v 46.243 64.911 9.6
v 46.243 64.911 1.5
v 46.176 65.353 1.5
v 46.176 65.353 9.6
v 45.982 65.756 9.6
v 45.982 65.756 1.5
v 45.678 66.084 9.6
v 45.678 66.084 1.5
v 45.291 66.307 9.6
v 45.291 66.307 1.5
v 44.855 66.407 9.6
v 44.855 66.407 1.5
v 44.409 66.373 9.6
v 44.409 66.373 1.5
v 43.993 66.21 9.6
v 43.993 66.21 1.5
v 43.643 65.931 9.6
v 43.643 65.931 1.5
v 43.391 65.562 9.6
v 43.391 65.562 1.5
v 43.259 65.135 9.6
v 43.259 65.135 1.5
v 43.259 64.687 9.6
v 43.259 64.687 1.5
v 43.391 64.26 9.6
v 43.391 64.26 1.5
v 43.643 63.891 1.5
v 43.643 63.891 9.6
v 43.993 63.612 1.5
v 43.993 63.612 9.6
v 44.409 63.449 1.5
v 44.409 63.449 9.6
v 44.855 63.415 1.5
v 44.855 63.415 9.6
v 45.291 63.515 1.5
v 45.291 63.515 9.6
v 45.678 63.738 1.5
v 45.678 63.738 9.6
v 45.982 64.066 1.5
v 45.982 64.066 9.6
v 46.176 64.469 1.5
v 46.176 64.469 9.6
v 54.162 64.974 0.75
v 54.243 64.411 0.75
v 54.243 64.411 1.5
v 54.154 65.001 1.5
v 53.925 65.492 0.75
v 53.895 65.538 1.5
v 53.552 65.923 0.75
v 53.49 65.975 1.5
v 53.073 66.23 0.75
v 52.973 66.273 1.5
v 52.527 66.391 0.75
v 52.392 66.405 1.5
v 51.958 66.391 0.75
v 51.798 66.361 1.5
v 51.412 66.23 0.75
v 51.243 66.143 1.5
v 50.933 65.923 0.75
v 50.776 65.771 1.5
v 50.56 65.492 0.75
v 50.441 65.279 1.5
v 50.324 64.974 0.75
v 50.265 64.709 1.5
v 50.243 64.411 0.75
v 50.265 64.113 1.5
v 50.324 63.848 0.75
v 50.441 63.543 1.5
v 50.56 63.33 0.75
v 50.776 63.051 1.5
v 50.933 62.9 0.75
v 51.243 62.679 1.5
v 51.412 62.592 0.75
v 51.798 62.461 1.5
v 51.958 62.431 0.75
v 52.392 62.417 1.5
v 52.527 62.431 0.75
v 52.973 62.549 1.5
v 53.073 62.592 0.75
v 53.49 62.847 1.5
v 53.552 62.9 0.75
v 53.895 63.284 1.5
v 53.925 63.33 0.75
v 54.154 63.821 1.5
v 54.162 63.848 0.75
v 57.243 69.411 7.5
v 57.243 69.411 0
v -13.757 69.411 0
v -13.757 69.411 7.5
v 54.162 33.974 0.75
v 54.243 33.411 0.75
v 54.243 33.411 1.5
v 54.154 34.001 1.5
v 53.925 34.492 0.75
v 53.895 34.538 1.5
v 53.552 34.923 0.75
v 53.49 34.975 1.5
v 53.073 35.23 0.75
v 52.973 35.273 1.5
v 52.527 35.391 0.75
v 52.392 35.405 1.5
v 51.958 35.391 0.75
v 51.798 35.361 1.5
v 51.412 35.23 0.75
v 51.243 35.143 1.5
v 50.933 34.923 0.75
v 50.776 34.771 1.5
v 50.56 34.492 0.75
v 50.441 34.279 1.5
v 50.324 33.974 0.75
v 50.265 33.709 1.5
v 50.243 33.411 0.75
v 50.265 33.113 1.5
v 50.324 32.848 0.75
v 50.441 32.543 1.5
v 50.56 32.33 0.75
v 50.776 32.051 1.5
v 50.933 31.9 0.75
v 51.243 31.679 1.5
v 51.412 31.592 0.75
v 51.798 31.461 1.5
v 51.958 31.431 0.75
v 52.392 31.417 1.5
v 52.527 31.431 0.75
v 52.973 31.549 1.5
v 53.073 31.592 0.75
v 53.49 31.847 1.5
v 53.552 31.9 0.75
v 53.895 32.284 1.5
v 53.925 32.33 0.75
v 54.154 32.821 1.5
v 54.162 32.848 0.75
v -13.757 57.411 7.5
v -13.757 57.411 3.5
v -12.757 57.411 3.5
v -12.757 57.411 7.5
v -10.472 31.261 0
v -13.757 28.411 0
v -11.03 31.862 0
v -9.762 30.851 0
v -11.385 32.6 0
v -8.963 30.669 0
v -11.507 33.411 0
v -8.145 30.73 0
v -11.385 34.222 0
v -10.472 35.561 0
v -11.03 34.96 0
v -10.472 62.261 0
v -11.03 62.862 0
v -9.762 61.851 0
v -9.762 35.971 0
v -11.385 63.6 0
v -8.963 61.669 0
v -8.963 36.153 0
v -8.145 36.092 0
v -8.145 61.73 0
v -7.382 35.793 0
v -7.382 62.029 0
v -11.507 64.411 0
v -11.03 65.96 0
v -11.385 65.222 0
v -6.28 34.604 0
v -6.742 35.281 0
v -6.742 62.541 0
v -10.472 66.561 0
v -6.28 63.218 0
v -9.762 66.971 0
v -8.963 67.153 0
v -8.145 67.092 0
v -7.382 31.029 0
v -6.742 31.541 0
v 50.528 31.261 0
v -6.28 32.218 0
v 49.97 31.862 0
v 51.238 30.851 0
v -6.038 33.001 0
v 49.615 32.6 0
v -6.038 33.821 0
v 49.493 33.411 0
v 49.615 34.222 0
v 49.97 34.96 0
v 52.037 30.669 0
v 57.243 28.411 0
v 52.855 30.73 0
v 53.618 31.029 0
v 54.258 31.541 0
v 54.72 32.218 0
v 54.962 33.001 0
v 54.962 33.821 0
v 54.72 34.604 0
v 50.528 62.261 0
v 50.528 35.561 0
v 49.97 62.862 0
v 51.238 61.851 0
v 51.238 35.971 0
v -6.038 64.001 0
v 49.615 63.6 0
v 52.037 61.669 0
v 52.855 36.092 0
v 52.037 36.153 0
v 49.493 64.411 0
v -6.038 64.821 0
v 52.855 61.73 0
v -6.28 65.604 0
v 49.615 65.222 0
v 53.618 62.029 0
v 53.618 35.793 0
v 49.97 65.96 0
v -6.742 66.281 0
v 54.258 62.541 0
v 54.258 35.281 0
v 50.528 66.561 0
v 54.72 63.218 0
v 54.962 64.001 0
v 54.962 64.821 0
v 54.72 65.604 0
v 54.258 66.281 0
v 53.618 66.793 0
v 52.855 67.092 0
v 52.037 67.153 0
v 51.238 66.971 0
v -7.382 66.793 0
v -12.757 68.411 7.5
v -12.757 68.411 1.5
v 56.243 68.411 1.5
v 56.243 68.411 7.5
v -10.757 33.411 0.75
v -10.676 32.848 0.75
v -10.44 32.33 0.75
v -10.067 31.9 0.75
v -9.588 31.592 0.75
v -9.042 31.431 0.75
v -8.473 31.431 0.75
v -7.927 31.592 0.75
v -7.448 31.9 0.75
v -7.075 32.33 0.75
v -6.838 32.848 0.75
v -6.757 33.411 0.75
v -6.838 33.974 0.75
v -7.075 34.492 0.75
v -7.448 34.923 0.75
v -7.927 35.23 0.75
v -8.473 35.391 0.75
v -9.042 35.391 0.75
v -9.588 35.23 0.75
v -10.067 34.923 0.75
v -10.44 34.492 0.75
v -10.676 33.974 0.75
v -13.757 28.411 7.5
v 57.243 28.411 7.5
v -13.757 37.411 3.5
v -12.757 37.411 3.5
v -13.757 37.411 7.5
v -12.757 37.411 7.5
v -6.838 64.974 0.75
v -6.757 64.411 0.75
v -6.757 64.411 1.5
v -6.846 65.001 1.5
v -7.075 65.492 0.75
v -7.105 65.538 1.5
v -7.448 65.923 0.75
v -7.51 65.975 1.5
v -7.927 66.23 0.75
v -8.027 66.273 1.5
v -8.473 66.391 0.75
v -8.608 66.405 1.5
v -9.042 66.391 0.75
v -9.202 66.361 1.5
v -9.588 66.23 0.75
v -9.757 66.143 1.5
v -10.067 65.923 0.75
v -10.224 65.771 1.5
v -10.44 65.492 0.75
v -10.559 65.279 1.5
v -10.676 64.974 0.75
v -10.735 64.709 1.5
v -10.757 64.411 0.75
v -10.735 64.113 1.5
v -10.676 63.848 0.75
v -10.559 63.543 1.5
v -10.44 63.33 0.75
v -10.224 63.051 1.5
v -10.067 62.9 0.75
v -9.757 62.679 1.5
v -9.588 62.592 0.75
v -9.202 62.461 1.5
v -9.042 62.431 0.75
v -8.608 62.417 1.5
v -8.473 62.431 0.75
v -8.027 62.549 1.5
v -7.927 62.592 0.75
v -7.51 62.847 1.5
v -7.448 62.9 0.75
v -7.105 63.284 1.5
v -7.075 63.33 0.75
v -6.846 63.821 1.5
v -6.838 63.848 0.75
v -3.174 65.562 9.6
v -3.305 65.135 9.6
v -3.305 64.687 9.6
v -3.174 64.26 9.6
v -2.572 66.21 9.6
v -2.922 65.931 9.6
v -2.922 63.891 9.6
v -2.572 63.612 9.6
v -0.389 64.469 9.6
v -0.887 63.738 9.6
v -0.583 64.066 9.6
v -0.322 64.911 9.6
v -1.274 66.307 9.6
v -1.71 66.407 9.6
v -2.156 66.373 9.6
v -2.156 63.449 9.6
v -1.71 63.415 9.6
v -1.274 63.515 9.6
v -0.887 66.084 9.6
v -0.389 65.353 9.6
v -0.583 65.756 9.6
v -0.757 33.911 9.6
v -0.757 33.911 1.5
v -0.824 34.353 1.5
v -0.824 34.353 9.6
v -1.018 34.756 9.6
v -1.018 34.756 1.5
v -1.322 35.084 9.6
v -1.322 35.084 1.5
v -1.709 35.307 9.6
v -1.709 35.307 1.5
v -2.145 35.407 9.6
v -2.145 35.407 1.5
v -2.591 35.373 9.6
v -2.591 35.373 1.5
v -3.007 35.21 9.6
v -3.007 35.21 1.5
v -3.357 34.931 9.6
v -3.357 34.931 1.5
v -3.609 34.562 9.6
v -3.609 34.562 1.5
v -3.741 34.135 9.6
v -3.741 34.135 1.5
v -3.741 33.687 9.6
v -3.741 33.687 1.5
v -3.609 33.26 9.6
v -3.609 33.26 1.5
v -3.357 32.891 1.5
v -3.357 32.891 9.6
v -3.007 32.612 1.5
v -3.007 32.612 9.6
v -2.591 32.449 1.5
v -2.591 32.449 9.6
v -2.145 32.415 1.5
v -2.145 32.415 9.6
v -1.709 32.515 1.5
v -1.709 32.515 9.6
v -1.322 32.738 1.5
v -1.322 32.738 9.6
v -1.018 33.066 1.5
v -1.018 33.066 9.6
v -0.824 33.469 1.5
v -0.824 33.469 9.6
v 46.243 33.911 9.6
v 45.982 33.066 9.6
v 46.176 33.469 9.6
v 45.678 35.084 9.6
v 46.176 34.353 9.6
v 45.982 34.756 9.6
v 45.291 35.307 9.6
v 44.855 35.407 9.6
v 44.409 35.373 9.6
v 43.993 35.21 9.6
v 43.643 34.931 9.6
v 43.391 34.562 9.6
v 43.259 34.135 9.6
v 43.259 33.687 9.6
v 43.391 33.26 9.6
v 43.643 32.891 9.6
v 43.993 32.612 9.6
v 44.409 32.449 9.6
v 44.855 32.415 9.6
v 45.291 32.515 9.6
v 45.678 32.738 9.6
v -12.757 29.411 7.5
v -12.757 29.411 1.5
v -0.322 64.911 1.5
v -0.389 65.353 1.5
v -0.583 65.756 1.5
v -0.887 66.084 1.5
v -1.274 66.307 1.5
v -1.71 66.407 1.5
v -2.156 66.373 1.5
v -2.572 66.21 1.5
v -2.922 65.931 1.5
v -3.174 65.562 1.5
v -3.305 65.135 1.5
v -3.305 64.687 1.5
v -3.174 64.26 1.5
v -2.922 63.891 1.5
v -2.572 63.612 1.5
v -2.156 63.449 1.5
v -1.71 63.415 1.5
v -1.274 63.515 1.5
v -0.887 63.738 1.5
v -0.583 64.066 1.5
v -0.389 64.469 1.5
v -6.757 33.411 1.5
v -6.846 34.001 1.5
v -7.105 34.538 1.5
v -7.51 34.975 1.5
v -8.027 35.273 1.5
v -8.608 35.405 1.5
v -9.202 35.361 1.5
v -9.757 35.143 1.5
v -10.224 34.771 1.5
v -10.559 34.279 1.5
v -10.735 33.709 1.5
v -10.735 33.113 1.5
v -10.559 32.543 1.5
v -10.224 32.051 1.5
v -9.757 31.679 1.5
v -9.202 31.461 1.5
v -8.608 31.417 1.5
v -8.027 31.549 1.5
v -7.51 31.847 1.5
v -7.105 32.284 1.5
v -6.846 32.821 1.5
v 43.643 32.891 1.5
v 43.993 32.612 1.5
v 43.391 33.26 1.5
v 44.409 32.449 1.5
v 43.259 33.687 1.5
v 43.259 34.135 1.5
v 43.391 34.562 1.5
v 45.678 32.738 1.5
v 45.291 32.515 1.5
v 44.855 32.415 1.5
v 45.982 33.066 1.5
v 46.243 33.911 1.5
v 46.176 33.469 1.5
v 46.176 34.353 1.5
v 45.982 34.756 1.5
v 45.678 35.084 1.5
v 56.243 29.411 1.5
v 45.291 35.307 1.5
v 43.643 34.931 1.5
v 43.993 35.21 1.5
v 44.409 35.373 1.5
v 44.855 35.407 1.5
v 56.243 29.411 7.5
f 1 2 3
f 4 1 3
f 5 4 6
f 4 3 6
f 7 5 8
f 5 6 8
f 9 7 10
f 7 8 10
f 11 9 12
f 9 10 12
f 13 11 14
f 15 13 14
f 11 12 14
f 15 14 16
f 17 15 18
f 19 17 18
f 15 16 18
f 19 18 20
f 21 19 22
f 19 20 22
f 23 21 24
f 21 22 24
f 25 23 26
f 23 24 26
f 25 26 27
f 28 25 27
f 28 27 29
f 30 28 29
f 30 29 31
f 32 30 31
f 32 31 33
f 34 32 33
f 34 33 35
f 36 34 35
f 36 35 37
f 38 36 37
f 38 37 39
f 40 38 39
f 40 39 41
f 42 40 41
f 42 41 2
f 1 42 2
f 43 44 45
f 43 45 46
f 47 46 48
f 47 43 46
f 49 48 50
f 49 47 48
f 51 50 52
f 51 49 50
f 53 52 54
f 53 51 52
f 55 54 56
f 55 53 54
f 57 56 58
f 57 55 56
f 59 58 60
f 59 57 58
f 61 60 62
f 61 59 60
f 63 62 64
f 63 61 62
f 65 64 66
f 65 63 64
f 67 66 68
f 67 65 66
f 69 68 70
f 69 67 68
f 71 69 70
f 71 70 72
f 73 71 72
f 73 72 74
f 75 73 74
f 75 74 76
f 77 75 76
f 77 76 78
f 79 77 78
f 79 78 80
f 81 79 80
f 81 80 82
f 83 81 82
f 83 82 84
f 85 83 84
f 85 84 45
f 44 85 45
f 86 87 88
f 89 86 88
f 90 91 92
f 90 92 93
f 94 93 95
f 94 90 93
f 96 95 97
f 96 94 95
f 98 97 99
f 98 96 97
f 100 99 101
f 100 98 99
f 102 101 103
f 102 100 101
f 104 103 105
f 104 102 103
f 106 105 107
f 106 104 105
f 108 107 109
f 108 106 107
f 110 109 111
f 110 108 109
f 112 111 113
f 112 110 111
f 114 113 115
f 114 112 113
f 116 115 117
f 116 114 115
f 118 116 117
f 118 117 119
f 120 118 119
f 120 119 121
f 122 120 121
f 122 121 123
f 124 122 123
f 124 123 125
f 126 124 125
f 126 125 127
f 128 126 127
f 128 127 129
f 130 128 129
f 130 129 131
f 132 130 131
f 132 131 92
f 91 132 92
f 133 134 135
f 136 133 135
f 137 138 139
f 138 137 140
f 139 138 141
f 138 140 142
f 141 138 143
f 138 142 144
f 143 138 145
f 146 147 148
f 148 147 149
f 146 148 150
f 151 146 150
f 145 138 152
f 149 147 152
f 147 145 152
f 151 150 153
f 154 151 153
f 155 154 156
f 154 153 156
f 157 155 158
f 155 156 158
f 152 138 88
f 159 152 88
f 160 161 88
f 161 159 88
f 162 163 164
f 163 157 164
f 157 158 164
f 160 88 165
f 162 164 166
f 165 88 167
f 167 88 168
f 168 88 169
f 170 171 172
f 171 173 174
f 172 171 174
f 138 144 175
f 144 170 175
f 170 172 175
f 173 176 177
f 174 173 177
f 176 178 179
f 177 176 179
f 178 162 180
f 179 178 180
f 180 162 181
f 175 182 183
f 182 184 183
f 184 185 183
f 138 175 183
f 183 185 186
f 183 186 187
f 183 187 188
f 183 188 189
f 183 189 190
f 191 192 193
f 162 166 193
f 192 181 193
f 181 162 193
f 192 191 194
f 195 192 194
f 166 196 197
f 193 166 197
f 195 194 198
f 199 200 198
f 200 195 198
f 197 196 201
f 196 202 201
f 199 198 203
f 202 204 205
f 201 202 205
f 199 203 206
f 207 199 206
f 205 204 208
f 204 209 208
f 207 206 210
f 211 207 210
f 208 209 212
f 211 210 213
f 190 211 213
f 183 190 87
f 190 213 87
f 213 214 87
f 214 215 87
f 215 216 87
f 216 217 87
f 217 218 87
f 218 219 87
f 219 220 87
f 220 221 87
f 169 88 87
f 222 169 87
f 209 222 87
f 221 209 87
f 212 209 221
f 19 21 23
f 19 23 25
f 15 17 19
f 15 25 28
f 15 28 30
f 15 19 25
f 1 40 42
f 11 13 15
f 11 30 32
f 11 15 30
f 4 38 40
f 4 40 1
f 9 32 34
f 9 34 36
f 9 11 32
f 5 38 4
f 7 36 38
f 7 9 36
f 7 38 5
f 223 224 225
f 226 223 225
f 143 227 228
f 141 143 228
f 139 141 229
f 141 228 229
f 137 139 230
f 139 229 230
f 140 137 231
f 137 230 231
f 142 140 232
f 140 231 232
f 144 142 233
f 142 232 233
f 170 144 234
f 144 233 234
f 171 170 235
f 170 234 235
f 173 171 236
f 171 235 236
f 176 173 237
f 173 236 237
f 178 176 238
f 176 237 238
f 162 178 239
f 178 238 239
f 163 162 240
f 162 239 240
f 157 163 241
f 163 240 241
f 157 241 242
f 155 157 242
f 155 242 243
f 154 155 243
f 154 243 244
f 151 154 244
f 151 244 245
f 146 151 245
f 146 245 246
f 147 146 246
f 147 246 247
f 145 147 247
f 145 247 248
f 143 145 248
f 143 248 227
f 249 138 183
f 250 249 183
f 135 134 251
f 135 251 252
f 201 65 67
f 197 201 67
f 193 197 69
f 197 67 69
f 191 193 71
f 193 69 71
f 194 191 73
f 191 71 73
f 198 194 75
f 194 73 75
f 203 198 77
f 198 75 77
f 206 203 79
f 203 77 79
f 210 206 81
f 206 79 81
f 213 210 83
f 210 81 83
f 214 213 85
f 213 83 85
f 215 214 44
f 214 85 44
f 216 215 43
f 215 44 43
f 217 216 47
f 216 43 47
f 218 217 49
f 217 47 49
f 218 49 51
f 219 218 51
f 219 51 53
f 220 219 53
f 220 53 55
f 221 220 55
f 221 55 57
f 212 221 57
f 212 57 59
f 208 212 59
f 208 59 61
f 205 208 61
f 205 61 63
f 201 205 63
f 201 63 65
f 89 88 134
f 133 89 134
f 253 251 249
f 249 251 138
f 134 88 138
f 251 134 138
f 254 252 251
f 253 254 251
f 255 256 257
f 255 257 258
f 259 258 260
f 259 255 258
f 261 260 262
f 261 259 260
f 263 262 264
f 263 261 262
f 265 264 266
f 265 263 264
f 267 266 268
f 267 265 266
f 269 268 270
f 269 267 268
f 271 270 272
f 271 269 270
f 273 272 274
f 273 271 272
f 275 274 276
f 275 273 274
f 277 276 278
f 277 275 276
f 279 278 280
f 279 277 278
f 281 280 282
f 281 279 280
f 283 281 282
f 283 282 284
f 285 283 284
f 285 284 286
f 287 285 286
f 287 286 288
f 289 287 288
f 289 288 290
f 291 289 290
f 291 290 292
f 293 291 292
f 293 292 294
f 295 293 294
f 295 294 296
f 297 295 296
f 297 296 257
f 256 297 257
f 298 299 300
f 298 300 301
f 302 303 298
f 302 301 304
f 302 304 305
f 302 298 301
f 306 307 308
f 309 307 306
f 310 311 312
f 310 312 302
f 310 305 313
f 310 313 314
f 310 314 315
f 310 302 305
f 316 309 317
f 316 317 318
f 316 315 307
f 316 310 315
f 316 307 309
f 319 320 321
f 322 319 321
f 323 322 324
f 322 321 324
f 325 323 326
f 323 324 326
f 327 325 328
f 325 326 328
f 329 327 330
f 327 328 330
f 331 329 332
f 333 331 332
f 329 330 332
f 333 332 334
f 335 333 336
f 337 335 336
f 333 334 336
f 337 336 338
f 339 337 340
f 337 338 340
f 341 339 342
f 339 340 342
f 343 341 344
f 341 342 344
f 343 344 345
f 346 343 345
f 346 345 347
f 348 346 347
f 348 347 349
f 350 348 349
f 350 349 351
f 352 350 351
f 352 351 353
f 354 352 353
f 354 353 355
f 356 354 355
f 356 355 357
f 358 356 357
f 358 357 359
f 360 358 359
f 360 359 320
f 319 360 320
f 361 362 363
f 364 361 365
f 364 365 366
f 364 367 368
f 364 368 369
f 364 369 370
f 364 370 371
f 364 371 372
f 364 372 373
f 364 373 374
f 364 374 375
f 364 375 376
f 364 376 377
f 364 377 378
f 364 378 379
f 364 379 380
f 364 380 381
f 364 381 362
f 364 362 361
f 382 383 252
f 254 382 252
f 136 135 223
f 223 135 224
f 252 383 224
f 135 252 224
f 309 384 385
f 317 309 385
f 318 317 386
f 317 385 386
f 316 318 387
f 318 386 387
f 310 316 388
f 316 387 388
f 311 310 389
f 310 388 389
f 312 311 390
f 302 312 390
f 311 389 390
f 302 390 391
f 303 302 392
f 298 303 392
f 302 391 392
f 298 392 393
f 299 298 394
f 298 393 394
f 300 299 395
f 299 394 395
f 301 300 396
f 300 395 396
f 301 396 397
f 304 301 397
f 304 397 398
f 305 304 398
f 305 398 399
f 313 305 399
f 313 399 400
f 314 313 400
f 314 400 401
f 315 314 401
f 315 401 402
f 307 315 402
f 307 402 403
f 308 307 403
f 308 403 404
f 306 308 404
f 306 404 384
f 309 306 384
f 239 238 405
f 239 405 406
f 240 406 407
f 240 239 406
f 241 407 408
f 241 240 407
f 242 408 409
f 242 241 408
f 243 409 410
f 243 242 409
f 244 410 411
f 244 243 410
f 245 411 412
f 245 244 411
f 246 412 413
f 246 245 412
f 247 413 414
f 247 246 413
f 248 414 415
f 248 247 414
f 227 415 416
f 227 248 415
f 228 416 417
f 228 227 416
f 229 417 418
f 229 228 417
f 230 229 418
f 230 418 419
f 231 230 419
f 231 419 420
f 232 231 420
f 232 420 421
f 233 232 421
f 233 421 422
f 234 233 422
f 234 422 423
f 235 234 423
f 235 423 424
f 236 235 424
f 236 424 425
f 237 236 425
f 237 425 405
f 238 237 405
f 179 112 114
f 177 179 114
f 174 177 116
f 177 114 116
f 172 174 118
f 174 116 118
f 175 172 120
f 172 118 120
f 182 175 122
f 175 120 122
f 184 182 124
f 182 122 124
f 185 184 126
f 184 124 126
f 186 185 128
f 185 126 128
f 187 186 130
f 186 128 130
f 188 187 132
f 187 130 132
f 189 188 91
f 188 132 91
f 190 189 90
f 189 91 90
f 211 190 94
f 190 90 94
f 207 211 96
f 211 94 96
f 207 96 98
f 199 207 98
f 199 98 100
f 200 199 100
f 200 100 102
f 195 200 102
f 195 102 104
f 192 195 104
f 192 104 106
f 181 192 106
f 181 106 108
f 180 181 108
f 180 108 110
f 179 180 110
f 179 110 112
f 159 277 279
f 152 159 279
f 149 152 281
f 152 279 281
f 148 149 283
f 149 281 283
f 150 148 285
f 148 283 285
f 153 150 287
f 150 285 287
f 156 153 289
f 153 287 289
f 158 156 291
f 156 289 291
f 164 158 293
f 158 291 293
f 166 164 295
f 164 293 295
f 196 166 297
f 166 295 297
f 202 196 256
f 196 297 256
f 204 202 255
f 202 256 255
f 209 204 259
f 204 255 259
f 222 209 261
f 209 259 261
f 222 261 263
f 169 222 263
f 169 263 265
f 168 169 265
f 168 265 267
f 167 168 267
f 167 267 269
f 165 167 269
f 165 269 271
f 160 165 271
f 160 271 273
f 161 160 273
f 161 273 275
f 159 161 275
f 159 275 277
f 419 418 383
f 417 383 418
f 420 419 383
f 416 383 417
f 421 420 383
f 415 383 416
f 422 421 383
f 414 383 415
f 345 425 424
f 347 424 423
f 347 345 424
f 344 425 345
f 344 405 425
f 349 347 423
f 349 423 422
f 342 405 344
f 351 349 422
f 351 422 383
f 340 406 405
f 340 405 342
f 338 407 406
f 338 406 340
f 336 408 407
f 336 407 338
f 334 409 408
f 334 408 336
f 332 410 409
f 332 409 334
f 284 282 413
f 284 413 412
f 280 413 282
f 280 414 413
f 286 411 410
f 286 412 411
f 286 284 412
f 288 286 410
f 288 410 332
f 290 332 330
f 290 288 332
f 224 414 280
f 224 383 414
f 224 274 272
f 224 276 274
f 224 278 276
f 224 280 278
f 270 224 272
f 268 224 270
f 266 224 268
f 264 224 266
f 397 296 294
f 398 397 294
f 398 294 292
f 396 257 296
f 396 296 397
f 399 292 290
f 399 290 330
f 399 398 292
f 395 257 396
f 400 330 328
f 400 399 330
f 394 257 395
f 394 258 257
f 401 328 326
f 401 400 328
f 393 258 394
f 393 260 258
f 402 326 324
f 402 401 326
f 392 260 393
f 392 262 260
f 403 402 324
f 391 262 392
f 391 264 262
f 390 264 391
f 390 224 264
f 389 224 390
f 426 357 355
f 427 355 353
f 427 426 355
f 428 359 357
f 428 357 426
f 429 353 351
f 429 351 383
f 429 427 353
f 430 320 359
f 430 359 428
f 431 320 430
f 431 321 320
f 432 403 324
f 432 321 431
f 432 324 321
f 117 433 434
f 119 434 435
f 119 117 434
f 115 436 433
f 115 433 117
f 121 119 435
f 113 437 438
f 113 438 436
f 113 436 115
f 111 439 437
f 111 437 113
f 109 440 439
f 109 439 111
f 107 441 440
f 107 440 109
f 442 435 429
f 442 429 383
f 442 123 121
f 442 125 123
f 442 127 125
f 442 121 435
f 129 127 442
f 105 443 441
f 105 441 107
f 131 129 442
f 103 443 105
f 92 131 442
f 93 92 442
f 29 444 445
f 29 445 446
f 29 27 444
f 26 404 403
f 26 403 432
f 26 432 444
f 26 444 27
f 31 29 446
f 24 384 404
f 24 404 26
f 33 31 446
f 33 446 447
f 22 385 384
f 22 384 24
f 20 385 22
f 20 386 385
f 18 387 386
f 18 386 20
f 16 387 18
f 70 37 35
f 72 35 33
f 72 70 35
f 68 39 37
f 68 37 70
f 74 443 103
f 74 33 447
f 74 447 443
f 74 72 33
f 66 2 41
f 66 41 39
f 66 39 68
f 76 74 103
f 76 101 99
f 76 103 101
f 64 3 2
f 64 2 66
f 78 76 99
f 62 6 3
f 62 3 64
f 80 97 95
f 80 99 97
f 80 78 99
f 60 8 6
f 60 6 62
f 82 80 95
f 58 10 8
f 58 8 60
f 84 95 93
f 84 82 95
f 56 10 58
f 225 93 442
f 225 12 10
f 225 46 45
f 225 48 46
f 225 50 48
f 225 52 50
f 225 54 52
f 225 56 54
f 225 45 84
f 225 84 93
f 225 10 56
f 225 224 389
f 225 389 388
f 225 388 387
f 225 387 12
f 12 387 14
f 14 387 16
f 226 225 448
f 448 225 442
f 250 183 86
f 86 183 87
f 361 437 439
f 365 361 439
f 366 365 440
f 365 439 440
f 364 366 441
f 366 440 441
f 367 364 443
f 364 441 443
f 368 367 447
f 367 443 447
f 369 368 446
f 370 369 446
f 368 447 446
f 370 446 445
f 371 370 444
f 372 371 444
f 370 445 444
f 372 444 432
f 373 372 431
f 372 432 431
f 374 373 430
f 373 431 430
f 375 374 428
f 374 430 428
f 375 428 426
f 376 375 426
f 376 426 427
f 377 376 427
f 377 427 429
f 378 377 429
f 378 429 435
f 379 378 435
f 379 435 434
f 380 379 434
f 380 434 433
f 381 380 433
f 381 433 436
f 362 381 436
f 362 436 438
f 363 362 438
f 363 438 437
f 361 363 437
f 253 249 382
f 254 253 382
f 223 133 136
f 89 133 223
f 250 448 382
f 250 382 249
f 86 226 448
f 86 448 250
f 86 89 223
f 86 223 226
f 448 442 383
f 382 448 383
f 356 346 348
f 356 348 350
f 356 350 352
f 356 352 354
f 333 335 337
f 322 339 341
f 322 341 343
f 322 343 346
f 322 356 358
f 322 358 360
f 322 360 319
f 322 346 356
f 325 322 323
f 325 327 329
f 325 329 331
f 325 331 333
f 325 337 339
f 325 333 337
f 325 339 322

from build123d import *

# Parameters (mm, degrees)
F0_R           = 2
F0_R_2         = 1.5
F0_W           = 1
F0_H           = 20
F1_DEPTH       = 1.5
F2_DEPTH       = 7.5
F3_DEPTH       = 9.6
F4_DEPTH       = 3.5
F5_D           = 3
F5_CSINK_D     = 5.5
F5_CSINK_ANGLE = 90


with BuildPart() as f1:
    # F0 (on Top) → F1 (new body)
    with BuildSketch(Plane.XY):
        Polygon((56.2425711751, 68.4110085815), (-12.7574288249, 68.4110085815), (-12.7574288249, 57.4110085815), (-12.7574288249, 37.4110085815), (-12.7574288249, 29.4110085815), (56.2425711751, 29.4110085815), align=None)
        with Locations((-8.7574288249, 33.4110085815)):
            Circle(F0_R, mode=Mode.SUBTRACT)
        with Locations((-2.2574288249, 33.9110085815)):
            Circle(F0_R_2, mode=Mode.SUBTRACT)
        with Locations((52.2425711751, 33.4110085815)):
            Circle(F0_R, mode=Mode.SUBTRACT)
        with Locations((44.7425711751, 33.9110085815)):
            Circle(F0_R_2, mode=Mode.SUBTRACT)
        with Locations((-8.7574288249, 64.4110085815)):
            Circle(F0_R, mode=Mode.SUBTRACT)
        with Locations((-1.8220887287, 64.9110085815)):
            Circle(F0_R_2, mode=Mode.SUBTRACT)
        with Locations((44.7425711751, 64.9110085815)):
            Circle(F0_R_2, mode=Mode.SUBTRACT)
        with Locations((52.2425711751, 64.4110085815)):
            Circle(F0_R, mode=Mode.SUBTRACT)
        Polygon((-12.7574288249, 57.4110085815), (-12.7574288249, 68.4110085815), (56.2425711751, 68.4110085815), (56.2425711751, 29.4110085815), (-12.7574288249, 29.4110085815), (-12.7574288249, 37.4110085815), (-13.7574288249, 37.4110085815), (-13.7574288249, 28.4110085815), (57.2425711751, 28.4110085815), (57.2425711751, 69.4110085815), (-13.7574288249, 69.4110085815), (-13.7574288249, 57.4110085815), align=None)
        with Locations((-2.2574288249, 33.9110085815)):
            Circle(F0_R_2)
        with Locations((44.7425711751, 33.9110085815)):
            Circle(F0_R_2)
        with Locations((44.7425711751, 64.9110085815)):
            Circle(F0_R_2)
        with Locations((-1.8220887287, 64.9110085815)):
            Circle(F0_R_2)
        with Locations((-13.2574288249, 47.4110085815)):
            Rectangle(F0_W, F0_H)
    extrude(amount=F1_DEPTH)

    # F0 (on Top) → F2 (join)
    with BuildSketch(Plane.XY):
        Polygon((-12.7574288249, 57.4110085815), (-12.7574288249, 68.4110085815), (56.2425711751, 68.4110085815), (56.2425711751, 29.4110085815), (-12.7574288249, 29.4110085815), (-12.7574288249, 37.4110085815), (-13.7574288249, 37.4110085815), (-13.7574288249, 28.4110085815), (57.2425711751, 28.4110085815), (57.2425711751, 69.4110085815), (-13.7574288249, 69.4110085815), (-13.7574288249, 57.4110085815), align=None)
    extrude(amount=F2_DEPTH)

    # F0 (on Top) → F3 (join)
    with BuildSketch(Plane.XY):
        with Locations((-1.8220887287, 64.9110085815)):
            Circle(F0_R_2)
        with Locations((-2.2574288249, 33.9110085815)):
            Circle(F0_R_2)
        with Locations((44.7425711751, 33.9110085815)):
            Circle(F0_R_2)
        with Locations((44.7425711751, 64.9110085815)):
            Circle(F0_R_2)
    extrude(amount=F3_DEPTH)

    # F0 (on Top) → F4 (join)
    with BuildSketch(Plane.XY):
        with Locations((-13.2574288249, 47.4110085815)):
            Rectangle(F0_W, F0_H)
    extrude(amount=F4_DEPTH)

    # F5 (through all)
    with Locations(Plane(origin=(0, 0, 0), x_dir=(1, 0, 0), z_dir=(0, 0, -1))):
        with Locations((52.2425711751, -64.4110085815), (52.2425711751, -33.4110085815), (-8.7574288249, -33.4110085815), (-8.7574288249, -64.4110085815)):
            CounterSinkHole(F5_D / 2, F5_CSINK_D / 2, counter_sink_angle=F5_CSINK_ANGLE)


solid = f1.part
